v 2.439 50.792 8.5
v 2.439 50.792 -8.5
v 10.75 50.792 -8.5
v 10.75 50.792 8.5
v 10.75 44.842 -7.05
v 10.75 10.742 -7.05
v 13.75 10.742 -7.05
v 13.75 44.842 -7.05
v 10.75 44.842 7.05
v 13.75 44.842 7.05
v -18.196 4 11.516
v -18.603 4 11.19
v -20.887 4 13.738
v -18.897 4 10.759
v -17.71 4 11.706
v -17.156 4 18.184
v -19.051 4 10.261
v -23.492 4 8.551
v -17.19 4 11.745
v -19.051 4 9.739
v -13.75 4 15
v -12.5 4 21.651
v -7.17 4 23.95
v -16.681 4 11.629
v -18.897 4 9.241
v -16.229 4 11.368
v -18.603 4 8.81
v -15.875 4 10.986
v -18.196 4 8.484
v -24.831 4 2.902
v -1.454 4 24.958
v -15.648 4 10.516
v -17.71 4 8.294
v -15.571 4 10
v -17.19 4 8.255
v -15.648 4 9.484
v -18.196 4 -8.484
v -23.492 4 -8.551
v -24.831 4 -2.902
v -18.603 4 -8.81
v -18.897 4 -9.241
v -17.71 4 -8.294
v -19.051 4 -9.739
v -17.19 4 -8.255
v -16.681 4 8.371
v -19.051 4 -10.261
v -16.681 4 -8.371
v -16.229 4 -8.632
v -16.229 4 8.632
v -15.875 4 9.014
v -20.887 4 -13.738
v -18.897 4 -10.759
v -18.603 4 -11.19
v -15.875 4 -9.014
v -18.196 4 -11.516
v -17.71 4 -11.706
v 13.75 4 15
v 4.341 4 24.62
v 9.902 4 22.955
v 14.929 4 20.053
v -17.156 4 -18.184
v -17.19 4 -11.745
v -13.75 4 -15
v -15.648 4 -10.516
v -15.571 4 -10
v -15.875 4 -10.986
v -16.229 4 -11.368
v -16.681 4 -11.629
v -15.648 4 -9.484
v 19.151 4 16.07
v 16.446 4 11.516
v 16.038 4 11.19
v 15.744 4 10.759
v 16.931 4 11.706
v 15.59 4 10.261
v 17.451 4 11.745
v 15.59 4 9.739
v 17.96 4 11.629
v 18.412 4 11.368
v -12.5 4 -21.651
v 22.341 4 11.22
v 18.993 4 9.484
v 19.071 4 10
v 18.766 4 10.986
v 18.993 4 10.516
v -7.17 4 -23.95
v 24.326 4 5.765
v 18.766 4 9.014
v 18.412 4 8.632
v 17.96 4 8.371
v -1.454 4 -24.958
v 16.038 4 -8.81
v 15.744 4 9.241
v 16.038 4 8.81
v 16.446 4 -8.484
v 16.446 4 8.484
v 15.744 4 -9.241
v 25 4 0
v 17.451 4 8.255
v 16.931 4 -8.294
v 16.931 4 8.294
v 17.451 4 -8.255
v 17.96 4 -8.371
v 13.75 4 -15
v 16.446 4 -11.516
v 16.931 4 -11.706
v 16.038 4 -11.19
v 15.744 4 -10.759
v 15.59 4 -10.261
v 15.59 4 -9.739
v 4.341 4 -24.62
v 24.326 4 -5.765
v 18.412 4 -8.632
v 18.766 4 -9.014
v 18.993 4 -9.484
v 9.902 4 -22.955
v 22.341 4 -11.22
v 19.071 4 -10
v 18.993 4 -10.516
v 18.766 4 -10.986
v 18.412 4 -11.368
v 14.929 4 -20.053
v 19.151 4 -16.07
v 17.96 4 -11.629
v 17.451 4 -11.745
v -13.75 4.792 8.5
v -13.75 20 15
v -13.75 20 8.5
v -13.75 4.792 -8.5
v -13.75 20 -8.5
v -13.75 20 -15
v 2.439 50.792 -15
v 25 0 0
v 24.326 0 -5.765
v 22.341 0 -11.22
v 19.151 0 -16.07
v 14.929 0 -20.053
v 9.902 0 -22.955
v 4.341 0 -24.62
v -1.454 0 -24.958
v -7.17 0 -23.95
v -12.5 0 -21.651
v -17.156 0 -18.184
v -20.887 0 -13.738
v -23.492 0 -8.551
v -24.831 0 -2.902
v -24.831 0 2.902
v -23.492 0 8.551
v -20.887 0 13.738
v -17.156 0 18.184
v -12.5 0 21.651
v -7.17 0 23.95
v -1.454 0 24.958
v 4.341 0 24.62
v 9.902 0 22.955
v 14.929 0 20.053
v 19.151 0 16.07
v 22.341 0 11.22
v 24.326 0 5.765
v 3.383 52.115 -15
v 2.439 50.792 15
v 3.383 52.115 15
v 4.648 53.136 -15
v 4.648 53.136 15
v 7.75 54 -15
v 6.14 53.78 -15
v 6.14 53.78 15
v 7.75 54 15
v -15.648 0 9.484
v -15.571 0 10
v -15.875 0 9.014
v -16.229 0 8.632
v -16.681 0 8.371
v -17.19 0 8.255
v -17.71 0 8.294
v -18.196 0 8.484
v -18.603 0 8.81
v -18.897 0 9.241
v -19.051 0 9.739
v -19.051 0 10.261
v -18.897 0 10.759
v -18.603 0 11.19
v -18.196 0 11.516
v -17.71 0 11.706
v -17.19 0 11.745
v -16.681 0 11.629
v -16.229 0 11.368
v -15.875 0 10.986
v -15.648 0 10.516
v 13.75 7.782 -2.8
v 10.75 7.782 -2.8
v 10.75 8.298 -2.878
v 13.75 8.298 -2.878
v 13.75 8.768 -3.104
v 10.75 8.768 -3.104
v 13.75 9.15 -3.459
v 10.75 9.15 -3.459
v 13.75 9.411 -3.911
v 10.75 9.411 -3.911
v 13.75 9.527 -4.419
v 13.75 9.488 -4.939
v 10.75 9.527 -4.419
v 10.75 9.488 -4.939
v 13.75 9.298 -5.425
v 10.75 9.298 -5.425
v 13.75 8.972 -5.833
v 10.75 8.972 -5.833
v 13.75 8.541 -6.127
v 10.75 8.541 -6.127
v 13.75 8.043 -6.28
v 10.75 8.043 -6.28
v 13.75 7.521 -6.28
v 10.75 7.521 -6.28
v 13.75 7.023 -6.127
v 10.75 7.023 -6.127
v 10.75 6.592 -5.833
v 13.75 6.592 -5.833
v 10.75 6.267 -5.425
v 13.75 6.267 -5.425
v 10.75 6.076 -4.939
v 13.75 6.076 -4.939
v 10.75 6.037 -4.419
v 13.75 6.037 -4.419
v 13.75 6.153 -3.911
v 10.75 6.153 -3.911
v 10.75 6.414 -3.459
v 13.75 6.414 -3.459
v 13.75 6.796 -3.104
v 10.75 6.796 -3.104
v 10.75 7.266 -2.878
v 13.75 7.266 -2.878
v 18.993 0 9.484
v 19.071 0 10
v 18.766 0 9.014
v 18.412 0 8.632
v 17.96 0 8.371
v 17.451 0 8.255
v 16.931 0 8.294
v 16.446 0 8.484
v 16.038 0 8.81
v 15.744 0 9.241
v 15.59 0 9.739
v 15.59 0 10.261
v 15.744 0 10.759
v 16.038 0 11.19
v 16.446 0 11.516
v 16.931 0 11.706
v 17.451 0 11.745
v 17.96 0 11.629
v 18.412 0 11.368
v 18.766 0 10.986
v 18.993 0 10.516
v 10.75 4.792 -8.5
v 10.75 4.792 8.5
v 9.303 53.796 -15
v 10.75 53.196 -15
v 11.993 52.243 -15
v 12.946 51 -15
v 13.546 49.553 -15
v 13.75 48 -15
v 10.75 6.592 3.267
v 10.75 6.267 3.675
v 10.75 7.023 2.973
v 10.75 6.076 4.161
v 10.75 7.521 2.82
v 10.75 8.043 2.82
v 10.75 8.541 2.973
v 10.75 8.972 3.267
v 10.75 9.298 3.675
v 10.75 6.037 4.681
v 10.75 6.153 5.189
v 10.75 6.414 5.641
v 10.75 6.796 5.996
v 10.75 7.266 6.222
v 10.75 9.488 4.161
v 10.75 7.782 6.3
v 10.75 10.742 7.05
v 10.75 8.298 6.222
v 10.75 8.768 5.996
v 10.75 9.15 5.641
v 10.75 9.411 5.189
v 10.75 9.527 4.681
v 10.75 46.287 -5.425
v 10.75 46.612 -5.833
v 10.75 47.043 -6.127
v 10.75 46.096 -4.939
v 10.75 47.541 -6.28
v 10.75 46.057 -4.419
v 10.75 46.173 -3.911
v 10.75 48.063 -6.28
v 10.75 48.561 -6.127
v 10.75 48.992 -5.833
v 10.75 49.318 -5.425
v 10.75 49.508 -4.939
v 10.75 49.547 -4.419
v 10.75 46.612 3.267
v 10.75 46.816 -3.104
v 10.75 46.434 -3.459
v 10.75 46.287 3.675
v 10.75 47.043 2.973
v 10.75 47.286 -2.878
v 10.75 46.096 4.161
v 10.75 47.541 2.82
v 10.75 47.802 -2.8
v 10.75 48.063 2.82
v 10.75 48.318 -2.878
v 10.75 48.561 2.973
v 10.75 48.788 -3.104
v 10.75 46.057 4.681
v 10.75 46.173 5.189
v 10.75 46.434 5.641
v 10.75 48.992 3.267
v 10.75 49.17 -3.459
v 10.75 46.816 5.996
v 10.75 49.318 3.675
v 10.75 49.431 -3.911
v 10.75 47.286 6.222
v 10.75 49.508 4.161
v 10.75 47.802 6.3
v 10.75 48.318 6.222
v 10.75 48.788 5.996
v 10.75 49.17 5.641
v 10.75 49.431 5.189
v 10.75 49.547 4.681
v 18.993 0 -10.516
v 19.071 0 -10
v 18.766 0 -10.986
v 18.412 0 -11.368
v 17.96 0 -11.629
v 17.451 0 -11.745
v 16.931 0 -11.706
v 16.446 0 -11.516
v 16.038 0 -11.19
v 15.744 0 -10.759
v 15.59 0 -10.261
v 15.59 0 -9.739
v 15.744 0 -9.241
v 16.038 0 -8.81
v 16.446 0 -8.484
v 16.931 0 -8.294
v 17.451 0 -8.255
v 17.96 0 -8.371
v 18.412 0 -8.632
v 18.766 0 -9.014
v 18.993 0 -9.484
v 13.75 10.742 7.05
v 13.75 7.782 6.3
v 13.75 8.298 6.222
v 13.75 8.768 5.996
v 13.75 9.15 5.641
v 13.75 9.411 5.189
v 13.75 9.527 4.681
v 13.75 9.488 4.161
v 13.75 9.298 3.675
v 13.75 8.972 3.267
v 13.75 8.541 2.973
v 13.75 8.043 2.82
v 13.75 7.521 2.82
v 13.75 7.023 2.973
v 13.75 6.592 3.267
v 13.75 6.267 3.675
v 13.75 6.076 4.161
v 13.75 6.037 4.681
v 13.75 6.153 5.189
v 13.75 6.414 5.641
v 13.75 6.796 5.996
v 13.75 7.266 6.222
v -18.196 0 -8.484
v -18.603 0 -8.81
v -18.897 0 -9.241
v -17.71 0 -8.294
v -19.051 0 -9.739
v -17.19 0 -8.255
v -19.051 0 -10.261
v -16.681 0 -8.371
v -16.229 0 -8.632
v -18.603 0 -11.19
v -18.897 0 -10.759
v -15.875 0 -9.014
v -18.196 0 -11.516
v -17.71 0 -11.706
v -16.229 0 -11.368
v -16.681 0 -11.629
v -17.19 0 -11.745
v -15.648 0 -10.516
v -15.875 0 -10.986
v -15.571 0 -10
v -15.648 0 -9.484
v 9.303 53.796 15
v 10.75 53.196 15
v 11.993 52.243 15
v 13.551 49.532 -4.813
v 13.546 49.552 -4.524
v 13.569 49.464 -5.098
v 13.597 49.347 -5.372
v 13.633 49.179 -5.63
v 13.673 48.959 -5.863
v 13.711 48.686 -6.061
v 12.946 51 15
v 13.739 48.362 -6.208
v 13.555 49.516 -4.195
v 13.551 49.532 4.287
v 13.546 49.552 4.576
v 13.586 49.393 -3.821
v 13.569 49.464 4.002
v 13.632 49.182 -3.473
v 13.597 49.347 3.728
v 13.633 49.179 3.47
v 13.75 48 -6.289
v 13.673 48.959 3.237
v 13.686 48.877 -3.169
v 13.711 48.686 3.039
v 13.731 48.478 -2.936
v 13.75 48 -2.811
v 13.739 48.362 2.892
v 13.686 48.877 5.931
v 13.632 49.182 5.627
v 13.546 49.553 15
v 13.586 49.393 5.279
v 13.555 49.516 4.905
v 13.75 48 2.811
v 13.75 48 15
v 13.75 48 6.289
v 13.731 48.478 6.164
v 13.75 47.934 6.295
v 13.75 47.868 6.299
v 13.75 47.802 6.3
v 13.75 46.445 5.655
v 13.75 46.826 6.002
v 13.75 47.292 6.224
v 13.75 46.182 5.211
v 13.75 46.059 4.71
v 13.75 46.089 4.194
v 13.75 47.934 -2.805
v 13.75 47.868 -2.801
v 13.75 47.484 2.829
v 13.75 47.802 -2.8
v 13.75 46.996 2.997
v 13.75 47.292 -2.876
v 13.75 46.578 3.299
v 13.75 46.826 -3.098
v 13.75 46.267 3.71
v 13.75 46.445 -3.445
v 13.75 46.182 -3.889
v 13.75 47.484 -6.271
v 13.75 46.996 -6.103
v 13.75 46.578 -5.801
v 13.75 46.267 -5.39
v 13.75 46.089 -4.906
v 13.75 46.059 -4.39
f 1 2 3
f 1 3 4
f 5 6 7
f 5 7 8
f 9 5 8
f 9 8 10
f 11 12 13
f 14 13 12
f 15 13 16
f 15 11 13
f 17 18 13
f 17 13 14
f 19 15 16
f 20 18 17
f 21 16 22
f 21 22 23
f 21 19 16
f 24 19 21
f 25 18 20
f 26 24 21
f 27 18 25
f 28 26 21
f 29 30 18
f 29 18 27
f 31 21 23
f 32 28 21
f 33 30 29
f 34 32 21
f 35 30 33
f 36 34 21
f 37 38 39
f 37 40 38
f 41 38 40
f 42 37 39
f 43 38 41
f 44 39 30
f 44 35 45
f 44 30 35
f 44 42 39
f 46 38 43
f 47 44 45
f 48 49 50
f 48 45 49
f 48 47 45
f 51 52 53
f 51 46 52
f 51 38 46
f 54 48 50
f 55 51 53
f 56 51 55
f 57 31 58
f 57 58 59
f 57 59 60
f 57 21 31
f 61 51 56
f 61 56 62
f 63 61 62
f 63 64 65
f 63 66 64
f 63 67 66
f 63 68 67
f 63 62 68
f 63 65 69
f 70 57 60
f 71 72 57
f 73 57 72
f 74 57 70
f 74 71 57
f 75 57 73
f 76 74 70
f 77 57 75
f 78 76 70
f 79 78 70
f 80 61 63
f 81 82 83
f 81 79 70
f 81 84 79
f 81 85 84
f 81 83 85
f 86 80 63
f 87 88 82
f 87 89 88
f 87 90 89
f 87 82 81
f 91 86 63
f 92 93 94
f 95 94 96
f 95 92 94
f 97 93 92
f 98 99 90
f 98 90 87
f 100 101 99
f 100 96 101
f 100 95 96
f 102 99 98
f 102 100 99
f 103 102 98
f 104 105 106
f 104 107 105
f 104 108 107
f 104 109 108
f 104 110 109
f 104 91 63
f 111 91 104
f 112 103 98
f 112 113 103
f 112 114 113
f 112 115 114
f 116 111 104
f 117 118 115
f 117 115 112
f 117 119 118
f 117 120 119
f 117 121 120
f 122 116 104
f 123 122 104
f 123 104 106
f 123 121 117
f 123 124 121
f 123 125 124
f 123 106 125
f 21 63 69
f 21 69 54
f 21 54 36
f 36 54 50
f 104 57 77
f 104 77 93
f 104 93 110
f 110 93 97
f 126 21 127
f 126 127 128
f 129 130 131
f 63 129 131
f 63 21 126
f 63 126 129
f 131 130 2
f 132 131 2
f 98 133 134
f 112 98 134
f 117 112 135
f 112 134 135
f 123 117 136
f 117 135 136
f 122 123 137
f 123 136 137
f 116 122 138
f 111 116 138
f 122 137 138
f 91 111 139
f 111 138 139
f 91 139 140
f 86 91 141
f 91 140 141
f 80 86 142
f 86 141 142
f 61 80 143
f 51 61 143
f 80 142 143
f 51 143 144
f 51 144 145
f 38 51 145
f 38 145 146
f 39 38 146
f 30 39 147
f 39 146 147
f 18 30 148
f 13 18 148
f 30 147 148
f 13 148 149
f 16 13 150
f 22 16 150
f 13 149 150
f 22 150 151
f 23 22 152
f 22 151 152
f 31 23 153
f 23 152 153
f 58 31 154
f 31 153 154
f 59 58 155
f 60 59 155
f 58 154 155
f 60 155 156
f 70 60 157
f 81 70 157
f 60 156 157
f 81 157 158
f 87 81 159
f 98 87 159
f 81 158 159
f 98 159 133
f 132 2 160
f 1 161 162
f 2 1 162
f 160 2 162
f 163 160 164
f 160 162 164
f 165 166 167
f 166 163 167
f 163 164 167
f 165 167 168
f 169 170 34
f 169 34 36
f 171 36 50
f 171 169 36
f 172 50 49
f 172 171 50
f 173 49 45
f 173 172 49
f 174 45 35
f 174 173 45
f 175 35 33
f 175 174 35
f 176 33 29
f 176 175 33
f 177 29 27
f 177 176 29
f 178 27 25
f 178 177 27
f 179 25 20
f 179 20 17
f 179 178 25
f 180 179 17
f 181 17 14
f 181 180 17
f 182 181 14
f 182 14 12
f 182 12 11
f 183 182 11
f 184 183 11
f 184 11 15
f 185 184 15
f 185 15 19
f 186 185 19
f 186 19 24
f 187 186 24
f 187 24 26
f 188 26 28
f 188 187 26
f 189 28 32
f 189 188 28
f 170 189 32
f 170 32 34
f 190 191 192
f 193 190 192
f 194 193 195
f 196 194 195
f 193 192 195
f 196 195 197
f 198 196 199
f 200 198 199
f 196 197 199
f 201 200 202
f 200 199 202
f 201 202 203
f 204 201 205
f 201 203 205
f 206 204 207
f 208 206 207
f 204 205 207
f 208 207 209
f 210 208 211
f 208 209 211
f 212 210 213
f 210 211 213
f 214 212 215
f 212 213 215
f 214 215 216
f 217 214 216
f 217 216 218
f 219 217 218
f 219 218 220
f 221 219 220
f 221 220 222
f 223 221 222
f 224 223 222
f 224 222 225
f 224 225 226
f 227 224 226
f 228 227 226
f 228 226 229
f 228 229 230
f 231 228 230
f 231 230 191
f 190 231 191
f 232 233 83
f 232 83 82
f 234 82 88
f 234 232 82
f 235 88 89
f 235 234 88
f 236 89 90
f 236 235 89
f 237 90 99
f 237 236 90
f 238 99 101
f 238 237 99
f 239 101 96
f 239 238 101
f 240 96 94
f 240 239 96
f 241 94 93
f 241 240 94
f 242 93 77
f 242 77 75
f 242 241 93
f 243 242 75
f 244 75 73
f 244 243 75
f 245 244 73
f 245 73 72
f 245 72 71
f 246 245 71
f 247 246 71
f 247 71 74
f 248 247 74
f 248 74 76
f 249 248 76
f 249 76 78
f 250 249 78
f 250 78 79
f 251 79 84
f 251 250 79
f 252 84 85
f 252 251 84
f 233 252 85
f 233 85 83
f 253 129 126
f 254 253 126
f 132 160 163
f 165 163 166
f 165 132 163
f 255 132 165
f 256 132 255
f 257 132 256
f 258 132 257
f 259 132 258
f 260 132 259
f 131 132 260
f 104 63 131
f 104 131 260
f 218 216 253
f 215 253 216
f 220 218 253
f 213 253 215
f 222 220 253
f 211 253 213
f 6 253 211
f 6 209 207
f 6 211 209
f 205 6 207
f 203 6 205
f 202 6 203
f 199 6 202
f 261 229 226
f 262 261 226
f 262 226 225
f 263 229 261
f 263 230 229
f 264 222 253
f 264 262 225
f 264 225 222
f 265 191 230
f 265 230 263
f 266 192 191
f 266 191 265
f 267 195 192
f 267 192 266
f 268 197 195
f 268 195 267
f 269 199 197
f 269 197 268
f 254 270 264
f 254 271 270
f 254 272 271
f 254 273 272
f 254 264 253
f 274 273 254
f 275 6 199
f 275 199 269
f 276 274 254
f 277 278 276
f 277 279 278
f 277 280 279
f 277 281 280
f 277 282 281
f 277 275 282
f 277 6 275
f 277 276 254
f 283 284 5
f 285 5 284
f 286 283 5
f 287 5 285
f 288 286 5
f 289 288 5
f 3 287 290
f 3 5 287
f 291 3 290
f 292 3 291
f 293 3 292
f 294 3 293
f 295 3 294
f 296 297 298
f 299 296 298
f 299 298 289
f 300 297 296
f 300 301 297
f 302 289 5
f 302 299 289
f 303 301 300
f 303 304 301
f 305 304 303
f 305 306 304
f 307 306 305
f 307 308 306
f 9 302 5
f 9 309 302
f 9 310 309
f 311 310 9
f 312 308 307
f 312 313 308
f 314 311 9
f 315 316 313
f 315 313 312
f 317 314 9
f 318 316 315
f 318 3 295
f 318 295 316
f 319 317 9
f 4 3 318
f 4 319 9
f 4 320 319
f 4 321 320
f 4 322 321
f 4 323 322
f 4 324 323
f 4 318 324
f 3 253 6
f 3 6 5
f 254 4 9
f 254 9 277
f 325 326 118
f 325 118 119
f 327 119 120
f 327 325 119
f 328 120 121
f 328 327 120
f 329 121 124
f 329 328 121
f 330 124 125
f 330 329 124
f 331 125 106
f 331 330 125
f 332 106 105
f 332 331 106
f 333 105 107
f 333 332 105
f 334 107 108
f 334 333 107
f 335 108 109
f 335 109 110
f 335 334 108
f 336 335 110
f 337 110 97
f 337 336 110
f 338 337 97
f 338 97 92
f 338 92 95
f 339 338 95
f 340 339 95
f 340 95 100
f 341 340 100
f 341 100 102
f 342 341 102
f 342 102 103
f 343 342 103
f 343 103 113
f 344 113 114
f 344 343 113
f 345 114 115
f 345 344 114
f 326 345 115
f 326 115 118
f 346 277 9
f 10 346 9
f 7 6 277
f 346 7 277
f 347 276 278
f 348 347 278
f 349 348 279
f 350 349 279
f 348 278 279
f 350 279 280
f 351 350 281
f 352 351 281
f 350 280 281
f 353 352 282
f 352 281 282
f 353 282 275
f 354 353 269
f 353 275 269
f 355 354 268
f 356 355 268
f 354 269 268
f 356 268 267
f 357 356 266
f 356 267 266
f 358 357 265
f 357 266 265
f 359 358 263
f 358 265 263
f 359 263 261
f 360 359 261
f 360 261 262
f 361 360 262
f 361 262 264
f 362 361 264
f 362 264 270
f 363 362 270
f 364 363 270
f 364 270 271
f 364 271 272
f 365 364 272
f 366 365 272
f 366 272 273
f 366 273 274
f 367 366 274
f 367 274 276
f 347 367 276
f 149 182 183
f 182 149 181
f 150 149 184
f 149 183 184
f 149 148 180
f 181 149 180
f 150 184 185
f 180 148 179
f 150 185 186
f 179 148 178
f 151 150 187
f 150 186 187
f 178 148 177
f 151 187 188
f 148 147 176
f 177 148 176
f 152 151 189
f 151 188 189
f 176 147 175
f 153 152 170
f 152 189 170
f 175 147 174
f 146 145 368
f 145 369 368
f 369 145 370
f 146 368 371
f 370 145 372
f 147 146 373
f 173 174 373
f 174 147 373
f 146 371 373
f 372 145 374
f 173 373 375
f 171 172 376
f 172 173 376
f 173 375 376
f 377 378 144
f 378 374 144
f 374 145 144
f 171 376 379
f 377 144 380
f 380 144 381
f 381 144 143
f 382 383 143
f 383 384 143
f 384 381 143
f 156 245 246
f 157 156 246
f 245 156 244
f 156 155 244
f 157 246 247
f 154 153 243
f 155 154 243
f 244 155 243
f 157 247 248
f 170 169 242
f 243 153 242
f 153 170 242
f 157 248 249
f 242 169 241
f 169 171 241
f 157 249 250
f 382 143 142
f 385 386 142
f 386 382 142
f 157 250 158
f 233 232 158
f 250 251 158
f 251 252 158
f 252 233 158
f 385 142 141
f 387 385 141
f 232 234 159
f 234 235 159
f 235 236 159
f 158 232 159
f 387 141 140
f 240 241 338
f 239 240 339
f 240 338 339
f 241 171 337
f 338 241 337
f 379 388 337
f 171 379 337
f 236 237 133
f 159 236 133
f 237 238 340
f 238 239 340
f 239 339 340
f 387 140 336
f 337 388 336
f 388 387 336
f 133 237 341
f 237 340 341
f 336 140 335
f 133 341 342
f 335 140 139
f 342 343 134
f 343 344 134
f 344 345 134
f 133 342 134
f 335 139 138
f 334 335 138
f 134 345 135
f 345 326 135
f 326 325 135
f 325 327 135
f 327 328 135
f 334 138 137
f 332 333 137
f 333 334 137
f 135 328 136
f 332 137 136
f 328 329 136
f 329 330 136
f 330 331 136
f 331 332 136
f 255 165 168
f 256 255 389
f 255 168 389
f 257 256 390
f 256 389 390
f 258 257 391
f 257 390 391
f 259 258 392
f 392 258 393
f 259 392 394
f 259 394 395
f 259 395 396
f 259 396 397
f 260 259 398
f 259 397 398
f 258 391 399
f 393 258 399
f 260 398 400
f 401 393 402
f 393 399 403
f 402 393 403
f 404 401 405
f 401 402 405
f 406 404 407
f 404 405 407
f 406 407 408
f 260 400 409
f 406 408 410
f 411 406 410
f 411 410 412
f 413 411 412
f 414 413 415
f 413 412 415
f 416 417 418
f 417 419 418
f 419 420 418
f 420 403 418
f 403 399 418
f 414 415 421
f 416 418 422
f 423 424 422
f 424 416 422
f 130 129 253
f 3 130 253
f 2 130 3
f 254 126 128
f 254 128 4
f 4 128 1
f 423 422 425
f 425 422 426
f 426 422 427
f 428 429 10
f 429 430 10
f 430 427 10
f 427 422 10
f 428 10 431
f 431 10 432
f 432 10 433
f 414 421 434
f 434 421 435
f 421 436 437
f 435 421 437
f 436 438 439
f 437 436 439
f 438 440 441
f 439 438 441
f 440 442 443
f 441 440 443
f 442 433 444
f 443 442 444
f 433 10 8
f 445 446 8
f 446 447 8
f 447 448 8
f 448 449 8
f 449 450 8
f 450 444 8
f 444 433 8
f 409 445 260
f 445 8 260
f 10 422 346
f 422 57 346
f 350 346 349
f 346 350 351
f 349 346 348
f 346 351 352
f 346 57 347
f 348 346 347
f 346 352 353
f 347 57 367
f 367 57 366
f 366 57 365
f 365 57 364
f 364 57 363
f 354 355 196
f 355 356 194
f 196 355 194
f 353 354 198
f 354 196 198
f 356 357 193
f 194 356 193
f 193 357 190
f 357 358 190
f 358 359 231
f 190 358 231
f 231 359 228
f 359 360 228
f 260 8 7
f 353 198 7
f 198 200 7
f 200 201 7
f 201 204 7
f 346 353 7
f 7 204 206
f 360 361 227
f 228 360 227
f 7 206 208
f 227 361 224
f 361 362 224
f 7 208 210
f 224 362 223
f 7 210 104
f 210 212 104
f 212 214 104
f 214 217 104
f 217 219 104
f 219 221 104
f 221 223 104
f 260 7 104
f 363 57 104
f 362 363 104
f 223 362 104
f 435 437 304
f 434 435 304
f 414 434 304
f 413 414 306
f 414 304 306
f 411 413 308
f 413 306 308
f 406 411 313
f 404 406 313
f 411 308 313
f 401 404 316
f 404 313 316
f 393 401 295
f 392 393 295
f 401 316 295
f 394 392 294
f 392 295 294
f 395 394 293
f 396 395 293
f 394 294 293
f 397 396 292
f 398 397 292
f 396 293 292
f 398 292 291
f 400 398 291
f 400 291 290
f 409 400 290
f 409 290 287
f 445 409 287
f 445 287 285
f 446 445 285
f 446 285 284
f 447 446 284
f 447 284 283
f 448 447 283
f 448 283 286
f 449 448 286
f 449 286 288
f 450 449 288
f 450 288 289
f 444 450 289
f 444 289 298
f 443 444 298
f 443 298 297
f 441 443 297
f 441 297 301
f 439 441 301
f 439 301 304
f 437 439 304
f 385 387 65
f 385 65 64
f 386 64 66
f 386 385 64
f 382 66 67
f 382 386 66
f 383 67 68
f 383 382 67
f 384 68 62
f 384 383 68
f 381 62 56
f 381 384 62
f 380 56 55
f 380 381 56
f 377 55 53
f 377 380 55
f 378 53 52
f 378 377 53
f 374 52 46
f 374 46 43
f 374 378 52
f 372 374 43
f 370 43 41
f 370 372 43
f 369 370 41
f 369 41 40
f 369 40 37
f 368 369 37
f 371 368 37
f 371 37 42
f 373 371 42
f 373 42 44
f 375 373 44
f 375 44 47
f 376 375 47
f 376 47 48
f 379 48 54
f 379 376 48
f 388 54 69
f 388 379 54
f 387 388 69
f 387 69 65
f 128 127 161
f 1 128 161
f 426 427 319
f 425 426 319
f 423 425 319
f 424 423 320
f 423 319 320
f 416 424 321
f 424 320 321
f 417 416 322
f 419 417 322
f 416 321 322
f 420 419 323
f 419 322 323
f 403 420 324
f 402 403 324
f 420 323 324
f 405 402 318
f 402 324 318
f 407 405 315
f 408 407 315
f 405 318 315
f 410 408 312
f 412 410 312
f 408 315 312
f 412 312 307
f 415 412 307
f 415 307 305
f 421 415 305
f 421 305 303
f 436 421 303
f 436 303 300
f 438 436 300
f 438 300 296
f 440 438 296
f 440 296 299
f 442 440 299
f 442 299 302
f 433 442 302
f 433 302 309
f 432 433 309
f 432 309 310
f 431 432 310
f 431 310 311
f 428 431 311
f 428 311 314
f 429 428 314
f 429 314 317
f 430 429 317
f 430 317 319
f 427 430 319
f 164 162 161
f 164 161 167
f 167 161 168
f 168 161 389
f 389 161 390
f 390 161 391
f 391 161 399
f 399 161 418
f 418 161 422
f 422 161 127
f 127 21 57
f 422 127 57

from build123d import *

# Parameters (mm, degrees)
SKETCH1_R           = 25
SKETCH1_R_2         = 1.75
BOSS_EXTRUDE1_DEPTH = 4
SKETCH2_W           = 27.5
SKETCH2_H           = 30
BOSS_EXTRUDE2_DEPTH = 50
CUT_EXTRUDE1_DEPTH  = 41
SKETCH4_W           = 17
SKETCH4_H           = 46
CUT_EXTRUDE2_DEPTH  = 24.5
CUT_EXTRUDE3_REACH  = 16.25
SKETCH5_R           = 1.75
SKETCH5_W           = 14.1
SKETCH5_H           = 34.1


with BuildPart() as part:
    # Sketch1 → Boss-Extrude1 (new body)
    with BuildSketch(Plane(origin=(0, 0, 0), x_dir=(1, 0, 0), z_dir=(0, 1, 0))):
        Circle(SKETCH1_R)
        with Locations((-17.320508076, 10)):
            Circle(SKETCH1_R_2, mode=Mode.SUBTRACT)
        with Locations((17.320508076, 10)):
            Circle(SKETCH1_R_2, mode=Mode.SUBTRACT)
        with Locations((17.320508076, -10)):
            Circle(SKETCH1_R_2, mode=Mode.SUBTRACT)
        with Locations((-17.320508076, -10)):
            Circle(SKETCH1_R_2, mode=Mode.SUBTRACT)
    extrude(amount=BOSS_EXTRUDE1_DEPTH)

    # Sketch2 → Boss-Extrude2 (add)
    with BuildSketch(Plane(origin=(0, 4, 0), x_dir=(1, 0, 0), z_dir=(0, 1, 0))):
        Rectangle(SKETCH2_W, SKETCH2_H)
    extrude(amount=BOSS_EXTRUDE2_DEPTH)

    # Sketch3 → Cut-Extrude1 (cut, through all)
    with BuildSketch(Plane.XY.offset(15)):
        with BuildLine():
            ThreePointArc((2.439273587, 50.792164924), (4.647822502, 53.135805173), (7.75, 54))
            Line((7.75, 54), (-13.75, 54))
            Line((-13.75, 54), (-13.75, 20))
            Line((-13.75, 20), (2.439273587, 50.792164924))
        make_face()
        with BuildLine():
            Line((13.75, 48), (13.75, 54))
            Line((13.75, 54), (7.75, 54))
            ThreePointArc((7.75, 54), (11.992640687, 52.242640687), (13.75, 48))
        make_face()
    extrude(amount=-CUT_EXTRUDE1_DEPTH, mode=Mode.SUBTRACT)

    # Sketch4 → Cut-Extrude2 (cut)
    with BuildSketch(Plane.ZY.offset(13.75)):
        with Locations((0, 27.792164924)):
            Rectangle(SKETCH4_W, SKETCH4_H)
    extrude(amount=-CUT_EXTRUDE2_DEPTH, mode=Mode.SUBTRACT)

    # Sketch5 → Cut-Extrude3 (cut, up to next)
    with BuildSketch(Plane.ZY.offset(-10.75), mode=Mode.PRIVATE) as cut_extrude3_sk1:
        with Locations((-4.55, 47.802164924)):
            Circle(SKETCH5_R)
    cut_extrude3_tool1 = extrude(cut_extrude3_sk1.sketch, amount=-CUT_EXTRUDE3_REACH, mode=Mode.PRIVATE) & part.part
    add(cut_extrude3_tool1.solids().sort_by_distance((10.75, 47.802165, -4.55))[0], mode=Mode.SUBTRACT)
    # Sketch5 → Cut-Extrude3 (cut, up to next)
    with BuildSketch(Plane.ZY.offset(-10.75), mode=Mode.PRIVATE) as cut_extrude3_sk2:
        with Locations((-4.55, 7.782164924)):
            Circle(SKETCH5_R)
    cut_extrude3_tool2 = extrude(cut_extrude3_sk2.sketch, amount=-CUT_EXTRUDE3_REACH, mode=Mode.PRIVATE) & part.part
    add(cut_extrude3_tool2.solids().sort_by_distance((10.75, 7.782165, -4.55))[0], mode=Mode.SUBTRACT)
    # Sketch5 → Cut-Extrude3 (cut, up to next)
    with BuildSketch(Plane.ZY.offset(-10.75), mode=Mode.PRIVATE) as cut_extrude3_sk3:
        with Locations((4.55, 7.782164924)):
            Circle(SKETCH5_R)
    cut_extrude3_tool3 = extrude(cut_extrude3_sk3.sketch, amount=-CUT_EXTRUDE3_REACH, mode=Mode.PRIVATE) & part.part
    add(cut_extrude3_tool3.solids().sort_by_distance((10.75, 7.782165, 4.55))[0], mode=Mode.SUBTRACT)
    # Sketch5 → Cut-Extrude3 (cut, up to next)
    with BuildSketch(Plane.ZY.offset(-10.75), mode=Mode.PRIVATE) as cut_extrude3_sk4:
        with Locations((4.55, 47.802164924)):
            Circle(SKETCH5_R)
    cut_extrude3_tool4 = extrude(cut_extrude3_sk4.sketch, amount=-CUT_EXTRUDE3_REACH, mode=Mode.PRIVATE) & part.part
    add(cut_extrude3_tool4.solids().sort_by_distance((10.75, 47.802165, 4.55))[0], mode=Mode.SUBTRACT)
    # Sketch5 → Cut-Extrude3 (cut, up to next)
    with BuildSketch(Plane.ZY.offset(-10.75), mode=Mode.PRIVATE) as cut_extrude3_sk5:
        with Locations((0, 27.792164924)):
            Rectangle(SKETCH5_W, SKETCH5_H)
    cut_extrude3_tool5 = extrude(cut_extrude3_sk5.sketch, amount=-CUT_EXTRUDE3_REACH, mode=Mode.PRIVATE) & part.part
    add(cut_extrude3_tool5.solids().sort_by_distance((10.75, 27.792165, 0))[0], mode=Mode.SUBTRACT)


solid = part.part
